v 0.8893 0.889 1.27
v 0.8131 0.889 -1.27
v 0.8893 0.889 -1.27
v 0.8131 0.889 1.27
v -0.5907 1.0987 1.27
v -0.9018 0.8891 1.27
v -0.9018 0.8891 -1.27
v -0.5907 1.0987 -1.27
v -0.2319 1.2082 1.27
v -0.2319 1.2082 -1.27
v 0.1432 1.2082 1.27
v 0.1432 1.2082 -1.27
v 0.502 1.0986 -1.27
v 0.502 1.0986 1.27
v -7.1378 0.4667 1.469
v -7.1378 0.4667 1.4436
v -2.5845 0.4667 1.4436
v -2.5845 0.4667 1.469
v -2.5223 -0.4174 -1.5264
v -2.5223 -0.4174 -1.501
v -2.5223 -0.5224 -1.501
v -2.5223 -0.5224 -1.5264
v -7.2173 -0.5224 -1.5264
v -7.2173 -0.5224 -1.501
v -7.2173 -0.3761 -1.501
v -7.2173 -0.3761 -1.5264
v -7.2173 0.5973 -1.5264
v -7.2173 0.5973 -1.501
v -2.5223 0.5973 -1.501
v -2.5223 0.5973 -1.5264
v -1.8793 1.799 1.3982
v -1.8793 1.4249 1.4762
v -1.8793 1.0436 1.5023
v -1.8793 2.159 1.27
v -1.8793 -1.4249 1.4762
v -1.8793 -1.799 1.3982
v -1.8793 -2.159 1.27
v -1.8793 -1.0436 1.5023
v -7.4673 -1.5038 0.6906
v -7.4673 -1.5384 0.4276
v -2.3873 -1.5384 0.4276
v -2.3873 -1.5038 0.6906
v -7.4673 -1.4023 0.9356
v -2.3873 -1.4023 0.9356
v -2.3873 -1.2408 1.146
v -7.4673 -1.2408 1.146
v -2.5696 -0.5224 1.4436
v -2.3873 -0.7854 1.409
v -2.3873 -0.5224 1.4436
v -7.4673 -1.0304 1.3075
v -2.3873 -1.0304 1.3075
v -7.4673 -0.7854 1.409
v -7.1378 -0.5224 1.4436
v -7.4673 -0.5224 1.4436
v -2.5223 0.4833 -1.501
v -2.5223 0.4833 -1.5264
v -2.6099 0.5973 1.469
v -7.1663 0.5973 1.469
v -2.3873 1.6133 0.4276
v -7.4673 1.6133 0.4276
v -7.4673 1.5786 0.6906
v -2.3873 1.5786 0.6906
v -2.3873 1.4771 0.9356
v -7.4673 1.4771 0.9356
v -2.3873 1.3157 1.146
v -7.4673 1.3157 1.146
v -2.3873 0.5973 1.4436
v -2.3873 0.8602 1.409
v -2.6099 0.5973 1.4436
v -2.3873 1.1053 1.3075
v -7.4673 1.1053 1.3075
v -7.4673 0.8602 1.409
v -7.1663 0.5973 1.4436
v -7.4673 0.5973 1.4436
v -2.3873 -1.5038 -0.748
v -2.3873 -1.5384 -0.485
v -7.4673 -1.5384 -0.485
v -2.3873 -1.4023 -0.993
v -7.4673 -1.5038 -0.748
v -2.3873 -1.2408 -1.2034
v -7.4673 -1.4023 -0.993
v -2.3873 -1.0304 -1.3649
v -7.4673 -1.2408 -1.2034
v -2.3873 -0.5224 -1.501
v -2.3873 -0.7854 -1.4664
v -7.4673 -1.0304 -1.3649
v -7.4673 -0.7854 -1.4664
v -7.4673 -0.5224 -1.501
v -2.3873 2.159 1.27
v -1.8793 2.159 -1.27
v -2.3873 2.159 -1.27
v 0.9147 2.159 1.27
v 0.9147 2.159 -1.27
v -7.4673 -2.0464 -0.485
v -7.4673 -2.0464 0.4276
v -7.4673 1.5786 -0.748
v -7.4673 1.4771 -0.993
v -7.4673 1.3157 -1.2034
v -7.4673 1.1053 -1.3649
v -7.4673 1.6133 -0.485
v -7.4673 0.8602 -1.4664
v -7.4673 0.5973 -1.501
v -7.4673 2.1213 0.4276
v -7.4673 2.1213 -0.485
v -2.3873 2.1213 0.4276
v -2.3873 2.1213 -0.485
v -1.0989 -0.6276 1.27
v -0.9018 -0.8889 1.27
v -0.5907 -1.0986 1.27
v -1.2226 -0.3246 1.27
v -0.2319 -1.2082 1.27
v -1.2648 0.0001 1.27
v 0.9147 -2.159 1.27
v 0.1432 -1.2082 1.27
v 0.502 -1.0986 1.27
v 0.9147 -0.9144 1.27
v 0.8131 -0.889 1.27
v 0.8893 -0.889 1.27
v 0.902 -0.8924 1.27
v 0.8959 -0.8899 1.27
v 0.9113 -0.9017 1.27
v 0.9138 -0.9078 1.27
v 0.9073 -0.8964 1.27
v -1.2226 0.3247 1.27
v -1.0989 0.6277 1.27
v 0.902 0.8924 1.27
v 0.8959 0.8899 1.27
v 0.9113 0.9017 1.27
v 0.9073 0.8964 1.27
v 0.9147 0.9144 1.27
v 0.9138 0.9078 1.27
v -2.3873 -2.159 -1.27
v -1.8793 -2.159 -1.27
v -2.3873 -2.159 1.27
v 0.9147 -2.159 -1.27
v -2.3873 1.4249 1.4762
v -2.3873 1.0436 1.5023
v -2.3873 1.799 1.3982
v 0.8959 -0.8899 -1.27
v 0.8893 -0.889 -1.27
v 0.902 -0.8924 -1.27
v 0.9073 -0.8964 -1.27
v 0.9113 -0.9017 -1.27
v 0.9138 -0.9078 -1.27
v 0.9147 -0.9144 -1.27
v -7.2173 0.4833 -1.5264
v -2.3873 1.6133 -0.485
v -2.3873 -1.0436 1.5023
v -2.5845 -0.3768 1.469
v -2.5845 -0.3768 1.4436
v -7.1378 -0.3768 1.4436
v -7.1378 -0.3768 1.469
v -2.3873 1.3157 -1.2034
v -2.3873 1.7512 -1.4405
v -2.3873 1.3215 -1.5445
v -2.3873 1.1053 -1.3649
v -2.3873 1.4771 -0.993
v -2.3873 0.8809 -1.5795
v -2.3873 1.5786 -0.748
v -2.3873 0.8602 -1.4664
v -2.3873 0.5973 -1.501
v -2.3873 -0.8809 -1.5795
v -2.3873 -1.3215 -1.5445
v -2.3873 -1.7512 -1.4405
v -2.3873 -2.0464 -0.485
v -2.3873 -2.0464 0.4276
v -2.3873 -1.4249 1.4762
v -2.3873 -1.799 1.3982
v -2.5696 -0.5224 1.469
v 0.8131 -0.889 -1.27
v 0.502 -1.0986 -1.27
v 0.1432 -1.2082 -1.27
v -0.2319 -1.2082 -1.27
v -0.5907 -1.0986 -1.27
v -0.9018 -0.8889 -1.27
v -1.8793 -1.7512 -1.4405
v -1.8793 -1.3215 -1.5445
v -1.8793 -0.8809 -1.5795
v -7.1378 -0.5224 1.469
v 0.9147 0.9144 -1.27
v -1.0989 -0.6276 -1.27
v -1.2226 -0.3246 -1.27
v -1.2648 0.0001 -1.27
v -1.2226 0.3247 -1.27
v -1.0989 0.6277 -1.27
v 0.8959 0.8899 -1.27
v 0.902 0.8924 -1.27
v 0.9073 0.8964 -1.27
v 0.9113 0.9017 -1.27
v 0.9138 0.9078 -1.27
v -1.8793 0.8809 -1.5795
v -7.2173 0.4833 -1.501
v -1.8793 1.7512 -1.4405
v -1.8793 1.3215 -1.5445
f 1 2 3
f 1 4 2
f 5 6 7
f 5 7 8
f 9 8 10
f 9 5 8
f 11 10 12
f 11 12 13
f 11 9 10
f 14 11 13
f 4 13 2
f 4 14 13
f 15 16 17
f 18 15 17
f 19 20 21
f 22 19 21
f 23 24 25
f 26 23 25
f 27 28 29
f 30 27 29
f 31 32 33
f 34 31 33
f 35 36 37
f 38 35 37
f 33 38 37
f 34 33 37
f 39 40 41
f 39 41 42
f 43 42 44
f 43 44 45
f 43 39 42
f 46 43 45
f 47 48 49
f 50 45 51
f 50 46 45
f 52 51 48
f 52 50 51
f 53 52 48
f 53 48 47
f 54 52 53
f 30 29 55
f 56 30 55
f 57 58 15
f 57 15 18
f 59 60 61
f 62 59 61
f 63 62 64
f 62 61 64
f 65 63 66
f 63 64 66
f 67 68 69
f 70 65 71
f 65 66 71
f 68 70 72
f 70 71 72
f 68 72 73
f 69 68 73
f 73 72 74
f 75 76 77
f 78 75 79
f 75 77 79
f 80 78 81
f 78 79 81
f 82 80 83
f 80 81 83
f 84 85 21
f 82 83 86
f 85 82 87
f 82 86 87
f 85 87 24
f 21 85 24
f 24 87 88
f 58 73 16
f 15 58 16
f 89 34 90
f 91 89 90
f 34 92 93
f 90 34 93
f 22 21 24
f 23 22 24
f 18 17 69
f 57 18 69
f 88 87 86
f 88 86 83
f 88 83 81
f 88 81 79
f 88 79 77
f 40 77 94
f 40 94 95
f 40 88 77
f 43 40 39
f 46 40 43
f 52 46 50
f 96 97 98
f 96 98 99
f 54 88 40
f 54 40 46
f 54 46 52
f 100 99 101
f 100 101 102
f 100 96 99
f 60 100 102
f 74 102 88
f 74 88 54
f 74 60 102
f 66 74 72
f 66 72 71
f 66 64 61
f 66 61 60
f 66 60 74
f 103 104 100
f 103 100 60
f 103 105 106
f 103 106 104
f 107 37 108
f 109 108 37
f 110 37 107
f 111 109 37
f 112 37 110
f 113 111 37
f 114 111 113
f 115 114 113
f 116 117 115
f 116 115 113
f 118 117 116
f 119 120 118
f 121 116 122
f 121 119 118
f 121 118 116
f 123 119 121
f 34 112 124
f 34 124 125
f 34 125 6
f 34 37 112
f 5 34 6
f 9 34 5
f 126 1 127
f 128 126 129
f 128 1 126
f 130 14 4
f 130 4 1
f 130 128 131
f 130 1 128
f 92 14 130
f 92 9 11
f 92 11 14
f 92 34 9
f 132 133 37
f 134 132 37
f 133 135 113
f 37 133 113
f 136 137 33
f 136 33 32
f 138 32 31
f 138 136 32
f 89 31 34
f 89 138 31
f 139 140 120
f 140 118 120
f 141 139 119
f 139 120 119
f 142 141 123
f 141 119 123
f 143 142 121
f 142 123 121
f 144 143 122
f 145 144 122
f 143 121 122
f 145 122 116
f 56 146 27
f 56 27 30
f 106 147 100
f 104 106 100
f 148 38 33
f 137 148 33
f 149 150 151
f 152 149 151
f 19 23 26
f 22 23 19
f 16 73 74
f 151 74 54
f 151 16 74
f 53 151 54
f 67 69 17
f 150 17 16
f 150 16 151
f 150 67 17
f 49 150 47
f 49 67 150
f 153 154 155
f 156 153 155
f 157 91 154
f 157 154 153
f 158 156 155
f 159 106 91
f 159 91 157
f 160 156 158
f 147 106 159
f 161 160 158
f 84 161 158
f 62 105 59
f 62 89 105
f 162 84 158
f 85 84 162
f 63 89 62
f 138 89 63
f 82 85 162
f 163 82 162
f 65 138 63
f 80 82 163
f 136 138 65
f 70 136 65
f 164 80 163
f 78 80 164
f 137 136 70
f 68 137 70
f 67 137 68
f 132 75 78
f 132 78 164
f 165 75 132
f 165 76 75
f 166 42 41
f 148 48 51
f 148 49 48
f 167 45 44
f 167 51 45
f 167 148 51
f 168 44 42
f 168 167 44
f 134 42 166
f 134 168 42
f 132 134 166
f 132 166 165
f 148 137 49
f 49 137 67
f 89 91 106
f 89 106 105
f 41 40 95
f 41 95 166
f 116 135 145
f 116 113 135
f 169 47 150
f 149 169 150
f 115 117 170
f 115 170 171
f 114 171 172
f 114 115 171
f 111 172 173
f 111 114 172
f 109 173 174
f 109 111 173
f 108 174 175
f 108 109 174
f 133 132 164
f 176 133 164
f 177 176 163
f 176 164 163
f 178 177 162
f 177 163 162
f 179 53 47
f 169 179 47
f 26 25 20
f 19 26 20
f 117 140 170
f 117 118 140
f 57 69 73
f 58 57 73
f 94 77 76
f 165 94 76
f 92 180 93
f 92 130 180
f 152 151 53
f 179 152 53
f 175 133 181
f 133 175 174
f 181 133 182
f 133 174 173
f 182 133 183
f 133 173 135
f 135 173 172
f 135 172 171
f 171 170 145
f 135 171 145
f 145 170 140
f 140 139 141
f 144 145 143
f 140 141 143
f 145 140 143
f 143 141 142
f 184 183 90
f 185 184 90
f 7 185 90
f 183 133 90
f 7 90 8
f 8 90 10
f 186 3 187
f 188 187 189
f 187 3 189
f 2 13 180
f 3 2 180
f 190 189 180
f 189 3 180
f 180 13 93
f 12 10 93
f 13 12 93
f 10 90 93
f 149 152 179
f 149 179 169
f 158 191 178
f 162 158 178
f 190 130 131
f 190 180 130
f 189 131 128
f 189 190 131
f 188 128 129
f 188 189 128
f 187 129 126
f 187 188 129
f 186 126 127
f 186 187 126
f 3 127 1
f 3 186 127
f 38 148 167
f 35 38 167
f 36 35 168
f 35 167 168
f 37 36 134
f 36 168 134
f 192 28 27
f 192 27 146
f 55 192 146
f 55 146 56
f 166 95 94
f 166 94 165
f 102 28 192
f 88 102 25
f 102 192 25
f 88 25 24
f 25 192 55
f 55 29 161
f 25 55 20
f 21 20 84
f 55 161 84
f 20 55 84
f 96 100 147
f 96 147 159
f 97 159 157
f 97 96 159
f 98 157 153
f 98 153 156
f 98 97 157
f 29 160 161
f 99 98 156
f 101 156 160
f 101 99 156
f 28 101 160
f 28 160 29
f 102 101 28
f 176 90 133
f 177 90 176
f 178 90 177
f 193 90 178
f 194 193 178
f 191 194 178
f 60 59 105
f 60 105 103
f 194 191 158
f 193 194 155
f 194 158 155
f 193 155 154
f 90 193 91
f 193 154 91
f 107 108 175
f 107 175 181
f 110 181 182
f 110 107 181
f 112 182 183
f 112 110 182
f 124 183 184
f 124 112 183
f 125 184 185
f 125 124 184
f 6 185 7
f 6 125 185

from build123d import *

# Parameters (mm, degrees)
F1_DEPTH    = 1.27
F2_R        = 0.0254
F4_DEPTH    = 0.508
F5_T1_DEPTH = 5.1142141328
F5_T3_DEPTH = 4.5716483018
F5_T5_DEPTH = 5.8519702279
F5_T7_DEPTH = 5.3913281872
F6_W        = 3.1516760678
F6_H        = 2.9446112536
F7_DEPTH    = 5.08
F8_T1_DEPTH = 7.62
F10_DEPTH   = 0.0254
F11_W       = 4.6949440148
F11_H       = 0.1139125334
F12_DEPTH   = 0.0254
F13_W       = 5.08
F13_H       = 0.9126112536
F14_DEPTH   = 0.508
F15_W       = 5.08
F15_H       = 0.9126112536
F16_DEPTH   = 0.508


# Not quite as in the source:
# - a fillet or chamfer that OpenCascade refuses, or shapes differently, is made with other operations: its cross-section is extruded or revolved along the edge and cut away or added


with BuildPart() as f1:
    # F0 (on Top) → F1 (new body, symmetric)
    with BuildSketch(Plane.XY):
        with BuildLine():
            Line((0.914706802, 2.159), (-1.879293198, 2.159))
            Line((-1.879293198, 2.159), (-1.879293198, -2.159))
            Line((-1.879293198, -2.159), (0.914706802, -2.159))
            Line((0.914706802, -2.159), (0.914706802, -0.889))
            Line((0.914706802, -0.889), (0.863906802, -0.889))
            Line((0.863906802, -0.889), (0.813106802, -0.889))
            ThreePointArc((0.813106802, -0.889), (-0.0443418563, -1.2221163224), (-0.901769336, -0.8889454908))
            ThreePointArc((-0.901769336, -0.8889454908), (-1.2648079256, 5.45092e-05), (-0.901769336, 0.8890545092))
            ThreePointArc((-0.901769336, 0.8890545092), (-0.0443206777, 1.2221708316), (0.813106802, 0.889))
            Line((0.813106802, 0.889), (0.863906802, 0.889))
            Line((0.863906802, 0.889), (0.914706802, 0.889))
            Line((0.914706802, 0.889), (0.914706802, 2.159))
        make_face()
    extrude(amount=F1_DEPTH, both=True)

    # F2
    f2_edges = [f1.edges().sort_by_distance(p)[0] for p in [
        (0.914707, 0.889, 0),
        (0.914707, -0.889, 0),
    ]]
    fillet(f2_edges, radius=F2_R)

    # F3 (on face) → F4 (join)
    with BuildSketch(Plane(origin=(-1.879293198, 0, 0), x_dir=(0, -1, 0), z_dir=(-1, 0, 0))):
        Polygon((-1.9648331217, 1.5023018932), (-2.159, 1.27), (-2.159, -1.27), (-1.9496894674, -1.5794709325), (1.8575610593, -1.5794709325), (2.159, -1.27), (2.159, 1.27), (1.8563199556, 1.5023018932), align=None)
    extrude(amount=F4_DEPTH)

    # F5: fillet of radius 2.794 on 4 edges, made by hand

    # F5_s2 → F5_t1 (cut)
    with BuildSketch(Plane.YZ.offset(-4.6904002644)):
        with BuildLine():
            ThreePointArc((1.0435902952, 1.5023018932), (1.6132619065, 1.4436099664), (2.159, 1.27))
            Line((2.159, 1.27), (1.9648331217, 1.5023018932))
            Line((1.9648331217, 1.5023018932), (1.0435902952, 1.5023018932))
        make_face()
    extrude(amount=F5_T1_DEPTH, mode=Mode.SUBTRACT)

    # F5_s4 → F5_t3 (cut)
    with BuildSketch(Plane.YZ.offset(-4.4191173489)):
        with BuildLine():
            ThreePointArc((-1.0435902952, 1.5023018932), (-1.6132619065, 1.4436099664), (-2.159, 1.27))
            Line((-2.159, 1.27), (-1.8563199556, 1.5023018932))
            Line((-1.8563199556, 1.5023018932), (-1.0435902952, 1.5023018932))
        make_face()
    extrude(amount=F5_T3_DEPTH, mode=Mode.SUBTRACT)

    # F5_s6 → F5_t5 (cut)
    with BuildSketch(Plane.YZ.offset(-5.0592783119)):
        with BuildLine():
            ThreePointArc((0.8808954219, -1.5794709325), (1.5384141613, -1.5010012872), (2.159, -1.27))
            Line((2.159, -1.27), (1.9496894674, -1.5794709325))
            Line((1.9496894674, -1.5794709325), (0.8808954219, -1.5794709325))
        make_face()
    extrude(amount=F5_T5_DEPTH, mode=Mode.SUBTRACT)

    # F5_s8 → F5_t7 (cut)
    with BuildSketch(Plane.YZ.offset(-4.8289572916)):
        with BuildLine():
            ThreePointArc((-2.159, -1.27), (-1.5384141613, -1.5010012872), (-0.8808954219, -1.5794709325))
            Line((-0.8808954219, -1.5794709325), (-1.8575610593, -1.5794709325))
            Line((-1.8575610593, -1.5794709325), (-2.159, -1.27))
        make_face()
    extrude(amount=F5_T7_DEPTH, mode=Mode.SUBTRACT)

    # F6 (on face) → F7 (join)
    with BuildSketch(Plane(origin=(-2.387293198, 0, 0), x_dir=(0, -1, 0), z_dir=(-1, 0, 0))):
        with Locations((-0.0374238726, -0.0286956604)):
            Rectangle(F6_W, F6_H)
    extrude(amount=F7_DEPTH)

    # F8: fillet of radius 1.016 on 4 edges, made by hand

    # F8_s2 → F8_t1 (cut)
    with BuildSketch(Plane.YZ.offset(-10.007293198)):
        with BuildLine():
            ThreePointArc((1.6132619065, 0.4276099664), (1.3156823962, 1.1460304561), (0.5972619065, 1.4436099664))
            Line((0.5972619065, 1.4436099664), (1.6132619065, 1.4436099664))
            Line((1.6132619065, 1.4436099664), (1.6132619065, 0.4276099664))
        make_face()
        with BuildLine():
            ThreePointArc((-1.5384141613, 0.4276099664), (-1.240834651, 1.1460304561), (-0.5224141613, 1.4436099664))
            Line((-0.5224141613, 1.4436099664), (-1.5384141613, 1.4436099664))
            Line((-1.5384141613, 1.4436099664), (-1.5384141613, 0.4276099664))
        make_face()
        with BuildLine():
            ThreePointArc((1.6132619065, -0.4850012872), (1.3156823962, -1.2034217769), (0.5972619065, -1.5010012872))
            Line((0.5972619065, -1.5010012872), (1.6132619065, -1.5010012872))
            Line((1.6132619065, -1.5010012872), (1.6132619065, -0.4850012872))
        make_face()
        with BuildLine():
            ThreePointArc((-1.5384141613, -0.4850012872), (-1.240834651, -1.2034217769), (-0.5224141613, -1.5010012872))
            Line((-0.5224141613, -1.5010012872), (-1.5384141613, -1.5010012872))
            Line((-1.5384141613, -1.5010012872), (-1.5384141613, -0.4850012872))
        make_face()
    extrude(amount=F8_T1_DEPTH, mode=Mode.SUBTRACT)

    # F9 (on face) → F10 (join)
    with BuildSketch(Plane.XY.offset(1.4436099664)):
        Polygon((-7.1662743576, 0.5972619065), (-7.1378163993, 0.466715981), (-2.5845263153, 0.466715981), (-2.609875286, 0.5972619065), align=None)
        Polygon((-2.5695776567, -0.5224141613), (-2.5845263153, -0.3768240858), (-7.1378163993, -0.3768240858), (-7.1378163993, -0.5224141613), align=None)
    extrude(amount=F10_DEPTH)

    # F11 (on face) → F12 (join)
    with BuildSketch(Plane(origin=(0, 0, -1.5010012872), x_dir=(1, 0, 0), z_dir=(0, 0, -1))):
        Polygon((-7.2172759101, 0.376087494), (-2.5223318953, 0.4174394126), (-2.5223318953, 0.5224141613), (-7.2172759101, 0.5224141613), align=None)
        with Locations((-4.8698039027, -0.5403056398)):
            Rectangle(F11_W, F11_H)
    extrude(amount=F12_DEPTH)

    # F13 (on face) → F14 (join)
    with BuildSketch(Plane(origin=(0, 1.6132619065, 0), x_dir=(-1, 0, 0), z_dir=(0, 1, 0))):
        with Locations((4.927293198, -0.0286956604)):
            Rectangle(F13_W, F13_H)
    extrude(amount=F14_DEPTH)

    # F15 (on face) → F16 (join)
    with BuildSketch(Plane.XZ.offset(1.5384141613)):
        with Locations((-4.927293198, -0.0286956604)):
            Rectangle(F15_W, F15_H)
    extrude(amount=F16_DEPTH)


solid = f1.part
